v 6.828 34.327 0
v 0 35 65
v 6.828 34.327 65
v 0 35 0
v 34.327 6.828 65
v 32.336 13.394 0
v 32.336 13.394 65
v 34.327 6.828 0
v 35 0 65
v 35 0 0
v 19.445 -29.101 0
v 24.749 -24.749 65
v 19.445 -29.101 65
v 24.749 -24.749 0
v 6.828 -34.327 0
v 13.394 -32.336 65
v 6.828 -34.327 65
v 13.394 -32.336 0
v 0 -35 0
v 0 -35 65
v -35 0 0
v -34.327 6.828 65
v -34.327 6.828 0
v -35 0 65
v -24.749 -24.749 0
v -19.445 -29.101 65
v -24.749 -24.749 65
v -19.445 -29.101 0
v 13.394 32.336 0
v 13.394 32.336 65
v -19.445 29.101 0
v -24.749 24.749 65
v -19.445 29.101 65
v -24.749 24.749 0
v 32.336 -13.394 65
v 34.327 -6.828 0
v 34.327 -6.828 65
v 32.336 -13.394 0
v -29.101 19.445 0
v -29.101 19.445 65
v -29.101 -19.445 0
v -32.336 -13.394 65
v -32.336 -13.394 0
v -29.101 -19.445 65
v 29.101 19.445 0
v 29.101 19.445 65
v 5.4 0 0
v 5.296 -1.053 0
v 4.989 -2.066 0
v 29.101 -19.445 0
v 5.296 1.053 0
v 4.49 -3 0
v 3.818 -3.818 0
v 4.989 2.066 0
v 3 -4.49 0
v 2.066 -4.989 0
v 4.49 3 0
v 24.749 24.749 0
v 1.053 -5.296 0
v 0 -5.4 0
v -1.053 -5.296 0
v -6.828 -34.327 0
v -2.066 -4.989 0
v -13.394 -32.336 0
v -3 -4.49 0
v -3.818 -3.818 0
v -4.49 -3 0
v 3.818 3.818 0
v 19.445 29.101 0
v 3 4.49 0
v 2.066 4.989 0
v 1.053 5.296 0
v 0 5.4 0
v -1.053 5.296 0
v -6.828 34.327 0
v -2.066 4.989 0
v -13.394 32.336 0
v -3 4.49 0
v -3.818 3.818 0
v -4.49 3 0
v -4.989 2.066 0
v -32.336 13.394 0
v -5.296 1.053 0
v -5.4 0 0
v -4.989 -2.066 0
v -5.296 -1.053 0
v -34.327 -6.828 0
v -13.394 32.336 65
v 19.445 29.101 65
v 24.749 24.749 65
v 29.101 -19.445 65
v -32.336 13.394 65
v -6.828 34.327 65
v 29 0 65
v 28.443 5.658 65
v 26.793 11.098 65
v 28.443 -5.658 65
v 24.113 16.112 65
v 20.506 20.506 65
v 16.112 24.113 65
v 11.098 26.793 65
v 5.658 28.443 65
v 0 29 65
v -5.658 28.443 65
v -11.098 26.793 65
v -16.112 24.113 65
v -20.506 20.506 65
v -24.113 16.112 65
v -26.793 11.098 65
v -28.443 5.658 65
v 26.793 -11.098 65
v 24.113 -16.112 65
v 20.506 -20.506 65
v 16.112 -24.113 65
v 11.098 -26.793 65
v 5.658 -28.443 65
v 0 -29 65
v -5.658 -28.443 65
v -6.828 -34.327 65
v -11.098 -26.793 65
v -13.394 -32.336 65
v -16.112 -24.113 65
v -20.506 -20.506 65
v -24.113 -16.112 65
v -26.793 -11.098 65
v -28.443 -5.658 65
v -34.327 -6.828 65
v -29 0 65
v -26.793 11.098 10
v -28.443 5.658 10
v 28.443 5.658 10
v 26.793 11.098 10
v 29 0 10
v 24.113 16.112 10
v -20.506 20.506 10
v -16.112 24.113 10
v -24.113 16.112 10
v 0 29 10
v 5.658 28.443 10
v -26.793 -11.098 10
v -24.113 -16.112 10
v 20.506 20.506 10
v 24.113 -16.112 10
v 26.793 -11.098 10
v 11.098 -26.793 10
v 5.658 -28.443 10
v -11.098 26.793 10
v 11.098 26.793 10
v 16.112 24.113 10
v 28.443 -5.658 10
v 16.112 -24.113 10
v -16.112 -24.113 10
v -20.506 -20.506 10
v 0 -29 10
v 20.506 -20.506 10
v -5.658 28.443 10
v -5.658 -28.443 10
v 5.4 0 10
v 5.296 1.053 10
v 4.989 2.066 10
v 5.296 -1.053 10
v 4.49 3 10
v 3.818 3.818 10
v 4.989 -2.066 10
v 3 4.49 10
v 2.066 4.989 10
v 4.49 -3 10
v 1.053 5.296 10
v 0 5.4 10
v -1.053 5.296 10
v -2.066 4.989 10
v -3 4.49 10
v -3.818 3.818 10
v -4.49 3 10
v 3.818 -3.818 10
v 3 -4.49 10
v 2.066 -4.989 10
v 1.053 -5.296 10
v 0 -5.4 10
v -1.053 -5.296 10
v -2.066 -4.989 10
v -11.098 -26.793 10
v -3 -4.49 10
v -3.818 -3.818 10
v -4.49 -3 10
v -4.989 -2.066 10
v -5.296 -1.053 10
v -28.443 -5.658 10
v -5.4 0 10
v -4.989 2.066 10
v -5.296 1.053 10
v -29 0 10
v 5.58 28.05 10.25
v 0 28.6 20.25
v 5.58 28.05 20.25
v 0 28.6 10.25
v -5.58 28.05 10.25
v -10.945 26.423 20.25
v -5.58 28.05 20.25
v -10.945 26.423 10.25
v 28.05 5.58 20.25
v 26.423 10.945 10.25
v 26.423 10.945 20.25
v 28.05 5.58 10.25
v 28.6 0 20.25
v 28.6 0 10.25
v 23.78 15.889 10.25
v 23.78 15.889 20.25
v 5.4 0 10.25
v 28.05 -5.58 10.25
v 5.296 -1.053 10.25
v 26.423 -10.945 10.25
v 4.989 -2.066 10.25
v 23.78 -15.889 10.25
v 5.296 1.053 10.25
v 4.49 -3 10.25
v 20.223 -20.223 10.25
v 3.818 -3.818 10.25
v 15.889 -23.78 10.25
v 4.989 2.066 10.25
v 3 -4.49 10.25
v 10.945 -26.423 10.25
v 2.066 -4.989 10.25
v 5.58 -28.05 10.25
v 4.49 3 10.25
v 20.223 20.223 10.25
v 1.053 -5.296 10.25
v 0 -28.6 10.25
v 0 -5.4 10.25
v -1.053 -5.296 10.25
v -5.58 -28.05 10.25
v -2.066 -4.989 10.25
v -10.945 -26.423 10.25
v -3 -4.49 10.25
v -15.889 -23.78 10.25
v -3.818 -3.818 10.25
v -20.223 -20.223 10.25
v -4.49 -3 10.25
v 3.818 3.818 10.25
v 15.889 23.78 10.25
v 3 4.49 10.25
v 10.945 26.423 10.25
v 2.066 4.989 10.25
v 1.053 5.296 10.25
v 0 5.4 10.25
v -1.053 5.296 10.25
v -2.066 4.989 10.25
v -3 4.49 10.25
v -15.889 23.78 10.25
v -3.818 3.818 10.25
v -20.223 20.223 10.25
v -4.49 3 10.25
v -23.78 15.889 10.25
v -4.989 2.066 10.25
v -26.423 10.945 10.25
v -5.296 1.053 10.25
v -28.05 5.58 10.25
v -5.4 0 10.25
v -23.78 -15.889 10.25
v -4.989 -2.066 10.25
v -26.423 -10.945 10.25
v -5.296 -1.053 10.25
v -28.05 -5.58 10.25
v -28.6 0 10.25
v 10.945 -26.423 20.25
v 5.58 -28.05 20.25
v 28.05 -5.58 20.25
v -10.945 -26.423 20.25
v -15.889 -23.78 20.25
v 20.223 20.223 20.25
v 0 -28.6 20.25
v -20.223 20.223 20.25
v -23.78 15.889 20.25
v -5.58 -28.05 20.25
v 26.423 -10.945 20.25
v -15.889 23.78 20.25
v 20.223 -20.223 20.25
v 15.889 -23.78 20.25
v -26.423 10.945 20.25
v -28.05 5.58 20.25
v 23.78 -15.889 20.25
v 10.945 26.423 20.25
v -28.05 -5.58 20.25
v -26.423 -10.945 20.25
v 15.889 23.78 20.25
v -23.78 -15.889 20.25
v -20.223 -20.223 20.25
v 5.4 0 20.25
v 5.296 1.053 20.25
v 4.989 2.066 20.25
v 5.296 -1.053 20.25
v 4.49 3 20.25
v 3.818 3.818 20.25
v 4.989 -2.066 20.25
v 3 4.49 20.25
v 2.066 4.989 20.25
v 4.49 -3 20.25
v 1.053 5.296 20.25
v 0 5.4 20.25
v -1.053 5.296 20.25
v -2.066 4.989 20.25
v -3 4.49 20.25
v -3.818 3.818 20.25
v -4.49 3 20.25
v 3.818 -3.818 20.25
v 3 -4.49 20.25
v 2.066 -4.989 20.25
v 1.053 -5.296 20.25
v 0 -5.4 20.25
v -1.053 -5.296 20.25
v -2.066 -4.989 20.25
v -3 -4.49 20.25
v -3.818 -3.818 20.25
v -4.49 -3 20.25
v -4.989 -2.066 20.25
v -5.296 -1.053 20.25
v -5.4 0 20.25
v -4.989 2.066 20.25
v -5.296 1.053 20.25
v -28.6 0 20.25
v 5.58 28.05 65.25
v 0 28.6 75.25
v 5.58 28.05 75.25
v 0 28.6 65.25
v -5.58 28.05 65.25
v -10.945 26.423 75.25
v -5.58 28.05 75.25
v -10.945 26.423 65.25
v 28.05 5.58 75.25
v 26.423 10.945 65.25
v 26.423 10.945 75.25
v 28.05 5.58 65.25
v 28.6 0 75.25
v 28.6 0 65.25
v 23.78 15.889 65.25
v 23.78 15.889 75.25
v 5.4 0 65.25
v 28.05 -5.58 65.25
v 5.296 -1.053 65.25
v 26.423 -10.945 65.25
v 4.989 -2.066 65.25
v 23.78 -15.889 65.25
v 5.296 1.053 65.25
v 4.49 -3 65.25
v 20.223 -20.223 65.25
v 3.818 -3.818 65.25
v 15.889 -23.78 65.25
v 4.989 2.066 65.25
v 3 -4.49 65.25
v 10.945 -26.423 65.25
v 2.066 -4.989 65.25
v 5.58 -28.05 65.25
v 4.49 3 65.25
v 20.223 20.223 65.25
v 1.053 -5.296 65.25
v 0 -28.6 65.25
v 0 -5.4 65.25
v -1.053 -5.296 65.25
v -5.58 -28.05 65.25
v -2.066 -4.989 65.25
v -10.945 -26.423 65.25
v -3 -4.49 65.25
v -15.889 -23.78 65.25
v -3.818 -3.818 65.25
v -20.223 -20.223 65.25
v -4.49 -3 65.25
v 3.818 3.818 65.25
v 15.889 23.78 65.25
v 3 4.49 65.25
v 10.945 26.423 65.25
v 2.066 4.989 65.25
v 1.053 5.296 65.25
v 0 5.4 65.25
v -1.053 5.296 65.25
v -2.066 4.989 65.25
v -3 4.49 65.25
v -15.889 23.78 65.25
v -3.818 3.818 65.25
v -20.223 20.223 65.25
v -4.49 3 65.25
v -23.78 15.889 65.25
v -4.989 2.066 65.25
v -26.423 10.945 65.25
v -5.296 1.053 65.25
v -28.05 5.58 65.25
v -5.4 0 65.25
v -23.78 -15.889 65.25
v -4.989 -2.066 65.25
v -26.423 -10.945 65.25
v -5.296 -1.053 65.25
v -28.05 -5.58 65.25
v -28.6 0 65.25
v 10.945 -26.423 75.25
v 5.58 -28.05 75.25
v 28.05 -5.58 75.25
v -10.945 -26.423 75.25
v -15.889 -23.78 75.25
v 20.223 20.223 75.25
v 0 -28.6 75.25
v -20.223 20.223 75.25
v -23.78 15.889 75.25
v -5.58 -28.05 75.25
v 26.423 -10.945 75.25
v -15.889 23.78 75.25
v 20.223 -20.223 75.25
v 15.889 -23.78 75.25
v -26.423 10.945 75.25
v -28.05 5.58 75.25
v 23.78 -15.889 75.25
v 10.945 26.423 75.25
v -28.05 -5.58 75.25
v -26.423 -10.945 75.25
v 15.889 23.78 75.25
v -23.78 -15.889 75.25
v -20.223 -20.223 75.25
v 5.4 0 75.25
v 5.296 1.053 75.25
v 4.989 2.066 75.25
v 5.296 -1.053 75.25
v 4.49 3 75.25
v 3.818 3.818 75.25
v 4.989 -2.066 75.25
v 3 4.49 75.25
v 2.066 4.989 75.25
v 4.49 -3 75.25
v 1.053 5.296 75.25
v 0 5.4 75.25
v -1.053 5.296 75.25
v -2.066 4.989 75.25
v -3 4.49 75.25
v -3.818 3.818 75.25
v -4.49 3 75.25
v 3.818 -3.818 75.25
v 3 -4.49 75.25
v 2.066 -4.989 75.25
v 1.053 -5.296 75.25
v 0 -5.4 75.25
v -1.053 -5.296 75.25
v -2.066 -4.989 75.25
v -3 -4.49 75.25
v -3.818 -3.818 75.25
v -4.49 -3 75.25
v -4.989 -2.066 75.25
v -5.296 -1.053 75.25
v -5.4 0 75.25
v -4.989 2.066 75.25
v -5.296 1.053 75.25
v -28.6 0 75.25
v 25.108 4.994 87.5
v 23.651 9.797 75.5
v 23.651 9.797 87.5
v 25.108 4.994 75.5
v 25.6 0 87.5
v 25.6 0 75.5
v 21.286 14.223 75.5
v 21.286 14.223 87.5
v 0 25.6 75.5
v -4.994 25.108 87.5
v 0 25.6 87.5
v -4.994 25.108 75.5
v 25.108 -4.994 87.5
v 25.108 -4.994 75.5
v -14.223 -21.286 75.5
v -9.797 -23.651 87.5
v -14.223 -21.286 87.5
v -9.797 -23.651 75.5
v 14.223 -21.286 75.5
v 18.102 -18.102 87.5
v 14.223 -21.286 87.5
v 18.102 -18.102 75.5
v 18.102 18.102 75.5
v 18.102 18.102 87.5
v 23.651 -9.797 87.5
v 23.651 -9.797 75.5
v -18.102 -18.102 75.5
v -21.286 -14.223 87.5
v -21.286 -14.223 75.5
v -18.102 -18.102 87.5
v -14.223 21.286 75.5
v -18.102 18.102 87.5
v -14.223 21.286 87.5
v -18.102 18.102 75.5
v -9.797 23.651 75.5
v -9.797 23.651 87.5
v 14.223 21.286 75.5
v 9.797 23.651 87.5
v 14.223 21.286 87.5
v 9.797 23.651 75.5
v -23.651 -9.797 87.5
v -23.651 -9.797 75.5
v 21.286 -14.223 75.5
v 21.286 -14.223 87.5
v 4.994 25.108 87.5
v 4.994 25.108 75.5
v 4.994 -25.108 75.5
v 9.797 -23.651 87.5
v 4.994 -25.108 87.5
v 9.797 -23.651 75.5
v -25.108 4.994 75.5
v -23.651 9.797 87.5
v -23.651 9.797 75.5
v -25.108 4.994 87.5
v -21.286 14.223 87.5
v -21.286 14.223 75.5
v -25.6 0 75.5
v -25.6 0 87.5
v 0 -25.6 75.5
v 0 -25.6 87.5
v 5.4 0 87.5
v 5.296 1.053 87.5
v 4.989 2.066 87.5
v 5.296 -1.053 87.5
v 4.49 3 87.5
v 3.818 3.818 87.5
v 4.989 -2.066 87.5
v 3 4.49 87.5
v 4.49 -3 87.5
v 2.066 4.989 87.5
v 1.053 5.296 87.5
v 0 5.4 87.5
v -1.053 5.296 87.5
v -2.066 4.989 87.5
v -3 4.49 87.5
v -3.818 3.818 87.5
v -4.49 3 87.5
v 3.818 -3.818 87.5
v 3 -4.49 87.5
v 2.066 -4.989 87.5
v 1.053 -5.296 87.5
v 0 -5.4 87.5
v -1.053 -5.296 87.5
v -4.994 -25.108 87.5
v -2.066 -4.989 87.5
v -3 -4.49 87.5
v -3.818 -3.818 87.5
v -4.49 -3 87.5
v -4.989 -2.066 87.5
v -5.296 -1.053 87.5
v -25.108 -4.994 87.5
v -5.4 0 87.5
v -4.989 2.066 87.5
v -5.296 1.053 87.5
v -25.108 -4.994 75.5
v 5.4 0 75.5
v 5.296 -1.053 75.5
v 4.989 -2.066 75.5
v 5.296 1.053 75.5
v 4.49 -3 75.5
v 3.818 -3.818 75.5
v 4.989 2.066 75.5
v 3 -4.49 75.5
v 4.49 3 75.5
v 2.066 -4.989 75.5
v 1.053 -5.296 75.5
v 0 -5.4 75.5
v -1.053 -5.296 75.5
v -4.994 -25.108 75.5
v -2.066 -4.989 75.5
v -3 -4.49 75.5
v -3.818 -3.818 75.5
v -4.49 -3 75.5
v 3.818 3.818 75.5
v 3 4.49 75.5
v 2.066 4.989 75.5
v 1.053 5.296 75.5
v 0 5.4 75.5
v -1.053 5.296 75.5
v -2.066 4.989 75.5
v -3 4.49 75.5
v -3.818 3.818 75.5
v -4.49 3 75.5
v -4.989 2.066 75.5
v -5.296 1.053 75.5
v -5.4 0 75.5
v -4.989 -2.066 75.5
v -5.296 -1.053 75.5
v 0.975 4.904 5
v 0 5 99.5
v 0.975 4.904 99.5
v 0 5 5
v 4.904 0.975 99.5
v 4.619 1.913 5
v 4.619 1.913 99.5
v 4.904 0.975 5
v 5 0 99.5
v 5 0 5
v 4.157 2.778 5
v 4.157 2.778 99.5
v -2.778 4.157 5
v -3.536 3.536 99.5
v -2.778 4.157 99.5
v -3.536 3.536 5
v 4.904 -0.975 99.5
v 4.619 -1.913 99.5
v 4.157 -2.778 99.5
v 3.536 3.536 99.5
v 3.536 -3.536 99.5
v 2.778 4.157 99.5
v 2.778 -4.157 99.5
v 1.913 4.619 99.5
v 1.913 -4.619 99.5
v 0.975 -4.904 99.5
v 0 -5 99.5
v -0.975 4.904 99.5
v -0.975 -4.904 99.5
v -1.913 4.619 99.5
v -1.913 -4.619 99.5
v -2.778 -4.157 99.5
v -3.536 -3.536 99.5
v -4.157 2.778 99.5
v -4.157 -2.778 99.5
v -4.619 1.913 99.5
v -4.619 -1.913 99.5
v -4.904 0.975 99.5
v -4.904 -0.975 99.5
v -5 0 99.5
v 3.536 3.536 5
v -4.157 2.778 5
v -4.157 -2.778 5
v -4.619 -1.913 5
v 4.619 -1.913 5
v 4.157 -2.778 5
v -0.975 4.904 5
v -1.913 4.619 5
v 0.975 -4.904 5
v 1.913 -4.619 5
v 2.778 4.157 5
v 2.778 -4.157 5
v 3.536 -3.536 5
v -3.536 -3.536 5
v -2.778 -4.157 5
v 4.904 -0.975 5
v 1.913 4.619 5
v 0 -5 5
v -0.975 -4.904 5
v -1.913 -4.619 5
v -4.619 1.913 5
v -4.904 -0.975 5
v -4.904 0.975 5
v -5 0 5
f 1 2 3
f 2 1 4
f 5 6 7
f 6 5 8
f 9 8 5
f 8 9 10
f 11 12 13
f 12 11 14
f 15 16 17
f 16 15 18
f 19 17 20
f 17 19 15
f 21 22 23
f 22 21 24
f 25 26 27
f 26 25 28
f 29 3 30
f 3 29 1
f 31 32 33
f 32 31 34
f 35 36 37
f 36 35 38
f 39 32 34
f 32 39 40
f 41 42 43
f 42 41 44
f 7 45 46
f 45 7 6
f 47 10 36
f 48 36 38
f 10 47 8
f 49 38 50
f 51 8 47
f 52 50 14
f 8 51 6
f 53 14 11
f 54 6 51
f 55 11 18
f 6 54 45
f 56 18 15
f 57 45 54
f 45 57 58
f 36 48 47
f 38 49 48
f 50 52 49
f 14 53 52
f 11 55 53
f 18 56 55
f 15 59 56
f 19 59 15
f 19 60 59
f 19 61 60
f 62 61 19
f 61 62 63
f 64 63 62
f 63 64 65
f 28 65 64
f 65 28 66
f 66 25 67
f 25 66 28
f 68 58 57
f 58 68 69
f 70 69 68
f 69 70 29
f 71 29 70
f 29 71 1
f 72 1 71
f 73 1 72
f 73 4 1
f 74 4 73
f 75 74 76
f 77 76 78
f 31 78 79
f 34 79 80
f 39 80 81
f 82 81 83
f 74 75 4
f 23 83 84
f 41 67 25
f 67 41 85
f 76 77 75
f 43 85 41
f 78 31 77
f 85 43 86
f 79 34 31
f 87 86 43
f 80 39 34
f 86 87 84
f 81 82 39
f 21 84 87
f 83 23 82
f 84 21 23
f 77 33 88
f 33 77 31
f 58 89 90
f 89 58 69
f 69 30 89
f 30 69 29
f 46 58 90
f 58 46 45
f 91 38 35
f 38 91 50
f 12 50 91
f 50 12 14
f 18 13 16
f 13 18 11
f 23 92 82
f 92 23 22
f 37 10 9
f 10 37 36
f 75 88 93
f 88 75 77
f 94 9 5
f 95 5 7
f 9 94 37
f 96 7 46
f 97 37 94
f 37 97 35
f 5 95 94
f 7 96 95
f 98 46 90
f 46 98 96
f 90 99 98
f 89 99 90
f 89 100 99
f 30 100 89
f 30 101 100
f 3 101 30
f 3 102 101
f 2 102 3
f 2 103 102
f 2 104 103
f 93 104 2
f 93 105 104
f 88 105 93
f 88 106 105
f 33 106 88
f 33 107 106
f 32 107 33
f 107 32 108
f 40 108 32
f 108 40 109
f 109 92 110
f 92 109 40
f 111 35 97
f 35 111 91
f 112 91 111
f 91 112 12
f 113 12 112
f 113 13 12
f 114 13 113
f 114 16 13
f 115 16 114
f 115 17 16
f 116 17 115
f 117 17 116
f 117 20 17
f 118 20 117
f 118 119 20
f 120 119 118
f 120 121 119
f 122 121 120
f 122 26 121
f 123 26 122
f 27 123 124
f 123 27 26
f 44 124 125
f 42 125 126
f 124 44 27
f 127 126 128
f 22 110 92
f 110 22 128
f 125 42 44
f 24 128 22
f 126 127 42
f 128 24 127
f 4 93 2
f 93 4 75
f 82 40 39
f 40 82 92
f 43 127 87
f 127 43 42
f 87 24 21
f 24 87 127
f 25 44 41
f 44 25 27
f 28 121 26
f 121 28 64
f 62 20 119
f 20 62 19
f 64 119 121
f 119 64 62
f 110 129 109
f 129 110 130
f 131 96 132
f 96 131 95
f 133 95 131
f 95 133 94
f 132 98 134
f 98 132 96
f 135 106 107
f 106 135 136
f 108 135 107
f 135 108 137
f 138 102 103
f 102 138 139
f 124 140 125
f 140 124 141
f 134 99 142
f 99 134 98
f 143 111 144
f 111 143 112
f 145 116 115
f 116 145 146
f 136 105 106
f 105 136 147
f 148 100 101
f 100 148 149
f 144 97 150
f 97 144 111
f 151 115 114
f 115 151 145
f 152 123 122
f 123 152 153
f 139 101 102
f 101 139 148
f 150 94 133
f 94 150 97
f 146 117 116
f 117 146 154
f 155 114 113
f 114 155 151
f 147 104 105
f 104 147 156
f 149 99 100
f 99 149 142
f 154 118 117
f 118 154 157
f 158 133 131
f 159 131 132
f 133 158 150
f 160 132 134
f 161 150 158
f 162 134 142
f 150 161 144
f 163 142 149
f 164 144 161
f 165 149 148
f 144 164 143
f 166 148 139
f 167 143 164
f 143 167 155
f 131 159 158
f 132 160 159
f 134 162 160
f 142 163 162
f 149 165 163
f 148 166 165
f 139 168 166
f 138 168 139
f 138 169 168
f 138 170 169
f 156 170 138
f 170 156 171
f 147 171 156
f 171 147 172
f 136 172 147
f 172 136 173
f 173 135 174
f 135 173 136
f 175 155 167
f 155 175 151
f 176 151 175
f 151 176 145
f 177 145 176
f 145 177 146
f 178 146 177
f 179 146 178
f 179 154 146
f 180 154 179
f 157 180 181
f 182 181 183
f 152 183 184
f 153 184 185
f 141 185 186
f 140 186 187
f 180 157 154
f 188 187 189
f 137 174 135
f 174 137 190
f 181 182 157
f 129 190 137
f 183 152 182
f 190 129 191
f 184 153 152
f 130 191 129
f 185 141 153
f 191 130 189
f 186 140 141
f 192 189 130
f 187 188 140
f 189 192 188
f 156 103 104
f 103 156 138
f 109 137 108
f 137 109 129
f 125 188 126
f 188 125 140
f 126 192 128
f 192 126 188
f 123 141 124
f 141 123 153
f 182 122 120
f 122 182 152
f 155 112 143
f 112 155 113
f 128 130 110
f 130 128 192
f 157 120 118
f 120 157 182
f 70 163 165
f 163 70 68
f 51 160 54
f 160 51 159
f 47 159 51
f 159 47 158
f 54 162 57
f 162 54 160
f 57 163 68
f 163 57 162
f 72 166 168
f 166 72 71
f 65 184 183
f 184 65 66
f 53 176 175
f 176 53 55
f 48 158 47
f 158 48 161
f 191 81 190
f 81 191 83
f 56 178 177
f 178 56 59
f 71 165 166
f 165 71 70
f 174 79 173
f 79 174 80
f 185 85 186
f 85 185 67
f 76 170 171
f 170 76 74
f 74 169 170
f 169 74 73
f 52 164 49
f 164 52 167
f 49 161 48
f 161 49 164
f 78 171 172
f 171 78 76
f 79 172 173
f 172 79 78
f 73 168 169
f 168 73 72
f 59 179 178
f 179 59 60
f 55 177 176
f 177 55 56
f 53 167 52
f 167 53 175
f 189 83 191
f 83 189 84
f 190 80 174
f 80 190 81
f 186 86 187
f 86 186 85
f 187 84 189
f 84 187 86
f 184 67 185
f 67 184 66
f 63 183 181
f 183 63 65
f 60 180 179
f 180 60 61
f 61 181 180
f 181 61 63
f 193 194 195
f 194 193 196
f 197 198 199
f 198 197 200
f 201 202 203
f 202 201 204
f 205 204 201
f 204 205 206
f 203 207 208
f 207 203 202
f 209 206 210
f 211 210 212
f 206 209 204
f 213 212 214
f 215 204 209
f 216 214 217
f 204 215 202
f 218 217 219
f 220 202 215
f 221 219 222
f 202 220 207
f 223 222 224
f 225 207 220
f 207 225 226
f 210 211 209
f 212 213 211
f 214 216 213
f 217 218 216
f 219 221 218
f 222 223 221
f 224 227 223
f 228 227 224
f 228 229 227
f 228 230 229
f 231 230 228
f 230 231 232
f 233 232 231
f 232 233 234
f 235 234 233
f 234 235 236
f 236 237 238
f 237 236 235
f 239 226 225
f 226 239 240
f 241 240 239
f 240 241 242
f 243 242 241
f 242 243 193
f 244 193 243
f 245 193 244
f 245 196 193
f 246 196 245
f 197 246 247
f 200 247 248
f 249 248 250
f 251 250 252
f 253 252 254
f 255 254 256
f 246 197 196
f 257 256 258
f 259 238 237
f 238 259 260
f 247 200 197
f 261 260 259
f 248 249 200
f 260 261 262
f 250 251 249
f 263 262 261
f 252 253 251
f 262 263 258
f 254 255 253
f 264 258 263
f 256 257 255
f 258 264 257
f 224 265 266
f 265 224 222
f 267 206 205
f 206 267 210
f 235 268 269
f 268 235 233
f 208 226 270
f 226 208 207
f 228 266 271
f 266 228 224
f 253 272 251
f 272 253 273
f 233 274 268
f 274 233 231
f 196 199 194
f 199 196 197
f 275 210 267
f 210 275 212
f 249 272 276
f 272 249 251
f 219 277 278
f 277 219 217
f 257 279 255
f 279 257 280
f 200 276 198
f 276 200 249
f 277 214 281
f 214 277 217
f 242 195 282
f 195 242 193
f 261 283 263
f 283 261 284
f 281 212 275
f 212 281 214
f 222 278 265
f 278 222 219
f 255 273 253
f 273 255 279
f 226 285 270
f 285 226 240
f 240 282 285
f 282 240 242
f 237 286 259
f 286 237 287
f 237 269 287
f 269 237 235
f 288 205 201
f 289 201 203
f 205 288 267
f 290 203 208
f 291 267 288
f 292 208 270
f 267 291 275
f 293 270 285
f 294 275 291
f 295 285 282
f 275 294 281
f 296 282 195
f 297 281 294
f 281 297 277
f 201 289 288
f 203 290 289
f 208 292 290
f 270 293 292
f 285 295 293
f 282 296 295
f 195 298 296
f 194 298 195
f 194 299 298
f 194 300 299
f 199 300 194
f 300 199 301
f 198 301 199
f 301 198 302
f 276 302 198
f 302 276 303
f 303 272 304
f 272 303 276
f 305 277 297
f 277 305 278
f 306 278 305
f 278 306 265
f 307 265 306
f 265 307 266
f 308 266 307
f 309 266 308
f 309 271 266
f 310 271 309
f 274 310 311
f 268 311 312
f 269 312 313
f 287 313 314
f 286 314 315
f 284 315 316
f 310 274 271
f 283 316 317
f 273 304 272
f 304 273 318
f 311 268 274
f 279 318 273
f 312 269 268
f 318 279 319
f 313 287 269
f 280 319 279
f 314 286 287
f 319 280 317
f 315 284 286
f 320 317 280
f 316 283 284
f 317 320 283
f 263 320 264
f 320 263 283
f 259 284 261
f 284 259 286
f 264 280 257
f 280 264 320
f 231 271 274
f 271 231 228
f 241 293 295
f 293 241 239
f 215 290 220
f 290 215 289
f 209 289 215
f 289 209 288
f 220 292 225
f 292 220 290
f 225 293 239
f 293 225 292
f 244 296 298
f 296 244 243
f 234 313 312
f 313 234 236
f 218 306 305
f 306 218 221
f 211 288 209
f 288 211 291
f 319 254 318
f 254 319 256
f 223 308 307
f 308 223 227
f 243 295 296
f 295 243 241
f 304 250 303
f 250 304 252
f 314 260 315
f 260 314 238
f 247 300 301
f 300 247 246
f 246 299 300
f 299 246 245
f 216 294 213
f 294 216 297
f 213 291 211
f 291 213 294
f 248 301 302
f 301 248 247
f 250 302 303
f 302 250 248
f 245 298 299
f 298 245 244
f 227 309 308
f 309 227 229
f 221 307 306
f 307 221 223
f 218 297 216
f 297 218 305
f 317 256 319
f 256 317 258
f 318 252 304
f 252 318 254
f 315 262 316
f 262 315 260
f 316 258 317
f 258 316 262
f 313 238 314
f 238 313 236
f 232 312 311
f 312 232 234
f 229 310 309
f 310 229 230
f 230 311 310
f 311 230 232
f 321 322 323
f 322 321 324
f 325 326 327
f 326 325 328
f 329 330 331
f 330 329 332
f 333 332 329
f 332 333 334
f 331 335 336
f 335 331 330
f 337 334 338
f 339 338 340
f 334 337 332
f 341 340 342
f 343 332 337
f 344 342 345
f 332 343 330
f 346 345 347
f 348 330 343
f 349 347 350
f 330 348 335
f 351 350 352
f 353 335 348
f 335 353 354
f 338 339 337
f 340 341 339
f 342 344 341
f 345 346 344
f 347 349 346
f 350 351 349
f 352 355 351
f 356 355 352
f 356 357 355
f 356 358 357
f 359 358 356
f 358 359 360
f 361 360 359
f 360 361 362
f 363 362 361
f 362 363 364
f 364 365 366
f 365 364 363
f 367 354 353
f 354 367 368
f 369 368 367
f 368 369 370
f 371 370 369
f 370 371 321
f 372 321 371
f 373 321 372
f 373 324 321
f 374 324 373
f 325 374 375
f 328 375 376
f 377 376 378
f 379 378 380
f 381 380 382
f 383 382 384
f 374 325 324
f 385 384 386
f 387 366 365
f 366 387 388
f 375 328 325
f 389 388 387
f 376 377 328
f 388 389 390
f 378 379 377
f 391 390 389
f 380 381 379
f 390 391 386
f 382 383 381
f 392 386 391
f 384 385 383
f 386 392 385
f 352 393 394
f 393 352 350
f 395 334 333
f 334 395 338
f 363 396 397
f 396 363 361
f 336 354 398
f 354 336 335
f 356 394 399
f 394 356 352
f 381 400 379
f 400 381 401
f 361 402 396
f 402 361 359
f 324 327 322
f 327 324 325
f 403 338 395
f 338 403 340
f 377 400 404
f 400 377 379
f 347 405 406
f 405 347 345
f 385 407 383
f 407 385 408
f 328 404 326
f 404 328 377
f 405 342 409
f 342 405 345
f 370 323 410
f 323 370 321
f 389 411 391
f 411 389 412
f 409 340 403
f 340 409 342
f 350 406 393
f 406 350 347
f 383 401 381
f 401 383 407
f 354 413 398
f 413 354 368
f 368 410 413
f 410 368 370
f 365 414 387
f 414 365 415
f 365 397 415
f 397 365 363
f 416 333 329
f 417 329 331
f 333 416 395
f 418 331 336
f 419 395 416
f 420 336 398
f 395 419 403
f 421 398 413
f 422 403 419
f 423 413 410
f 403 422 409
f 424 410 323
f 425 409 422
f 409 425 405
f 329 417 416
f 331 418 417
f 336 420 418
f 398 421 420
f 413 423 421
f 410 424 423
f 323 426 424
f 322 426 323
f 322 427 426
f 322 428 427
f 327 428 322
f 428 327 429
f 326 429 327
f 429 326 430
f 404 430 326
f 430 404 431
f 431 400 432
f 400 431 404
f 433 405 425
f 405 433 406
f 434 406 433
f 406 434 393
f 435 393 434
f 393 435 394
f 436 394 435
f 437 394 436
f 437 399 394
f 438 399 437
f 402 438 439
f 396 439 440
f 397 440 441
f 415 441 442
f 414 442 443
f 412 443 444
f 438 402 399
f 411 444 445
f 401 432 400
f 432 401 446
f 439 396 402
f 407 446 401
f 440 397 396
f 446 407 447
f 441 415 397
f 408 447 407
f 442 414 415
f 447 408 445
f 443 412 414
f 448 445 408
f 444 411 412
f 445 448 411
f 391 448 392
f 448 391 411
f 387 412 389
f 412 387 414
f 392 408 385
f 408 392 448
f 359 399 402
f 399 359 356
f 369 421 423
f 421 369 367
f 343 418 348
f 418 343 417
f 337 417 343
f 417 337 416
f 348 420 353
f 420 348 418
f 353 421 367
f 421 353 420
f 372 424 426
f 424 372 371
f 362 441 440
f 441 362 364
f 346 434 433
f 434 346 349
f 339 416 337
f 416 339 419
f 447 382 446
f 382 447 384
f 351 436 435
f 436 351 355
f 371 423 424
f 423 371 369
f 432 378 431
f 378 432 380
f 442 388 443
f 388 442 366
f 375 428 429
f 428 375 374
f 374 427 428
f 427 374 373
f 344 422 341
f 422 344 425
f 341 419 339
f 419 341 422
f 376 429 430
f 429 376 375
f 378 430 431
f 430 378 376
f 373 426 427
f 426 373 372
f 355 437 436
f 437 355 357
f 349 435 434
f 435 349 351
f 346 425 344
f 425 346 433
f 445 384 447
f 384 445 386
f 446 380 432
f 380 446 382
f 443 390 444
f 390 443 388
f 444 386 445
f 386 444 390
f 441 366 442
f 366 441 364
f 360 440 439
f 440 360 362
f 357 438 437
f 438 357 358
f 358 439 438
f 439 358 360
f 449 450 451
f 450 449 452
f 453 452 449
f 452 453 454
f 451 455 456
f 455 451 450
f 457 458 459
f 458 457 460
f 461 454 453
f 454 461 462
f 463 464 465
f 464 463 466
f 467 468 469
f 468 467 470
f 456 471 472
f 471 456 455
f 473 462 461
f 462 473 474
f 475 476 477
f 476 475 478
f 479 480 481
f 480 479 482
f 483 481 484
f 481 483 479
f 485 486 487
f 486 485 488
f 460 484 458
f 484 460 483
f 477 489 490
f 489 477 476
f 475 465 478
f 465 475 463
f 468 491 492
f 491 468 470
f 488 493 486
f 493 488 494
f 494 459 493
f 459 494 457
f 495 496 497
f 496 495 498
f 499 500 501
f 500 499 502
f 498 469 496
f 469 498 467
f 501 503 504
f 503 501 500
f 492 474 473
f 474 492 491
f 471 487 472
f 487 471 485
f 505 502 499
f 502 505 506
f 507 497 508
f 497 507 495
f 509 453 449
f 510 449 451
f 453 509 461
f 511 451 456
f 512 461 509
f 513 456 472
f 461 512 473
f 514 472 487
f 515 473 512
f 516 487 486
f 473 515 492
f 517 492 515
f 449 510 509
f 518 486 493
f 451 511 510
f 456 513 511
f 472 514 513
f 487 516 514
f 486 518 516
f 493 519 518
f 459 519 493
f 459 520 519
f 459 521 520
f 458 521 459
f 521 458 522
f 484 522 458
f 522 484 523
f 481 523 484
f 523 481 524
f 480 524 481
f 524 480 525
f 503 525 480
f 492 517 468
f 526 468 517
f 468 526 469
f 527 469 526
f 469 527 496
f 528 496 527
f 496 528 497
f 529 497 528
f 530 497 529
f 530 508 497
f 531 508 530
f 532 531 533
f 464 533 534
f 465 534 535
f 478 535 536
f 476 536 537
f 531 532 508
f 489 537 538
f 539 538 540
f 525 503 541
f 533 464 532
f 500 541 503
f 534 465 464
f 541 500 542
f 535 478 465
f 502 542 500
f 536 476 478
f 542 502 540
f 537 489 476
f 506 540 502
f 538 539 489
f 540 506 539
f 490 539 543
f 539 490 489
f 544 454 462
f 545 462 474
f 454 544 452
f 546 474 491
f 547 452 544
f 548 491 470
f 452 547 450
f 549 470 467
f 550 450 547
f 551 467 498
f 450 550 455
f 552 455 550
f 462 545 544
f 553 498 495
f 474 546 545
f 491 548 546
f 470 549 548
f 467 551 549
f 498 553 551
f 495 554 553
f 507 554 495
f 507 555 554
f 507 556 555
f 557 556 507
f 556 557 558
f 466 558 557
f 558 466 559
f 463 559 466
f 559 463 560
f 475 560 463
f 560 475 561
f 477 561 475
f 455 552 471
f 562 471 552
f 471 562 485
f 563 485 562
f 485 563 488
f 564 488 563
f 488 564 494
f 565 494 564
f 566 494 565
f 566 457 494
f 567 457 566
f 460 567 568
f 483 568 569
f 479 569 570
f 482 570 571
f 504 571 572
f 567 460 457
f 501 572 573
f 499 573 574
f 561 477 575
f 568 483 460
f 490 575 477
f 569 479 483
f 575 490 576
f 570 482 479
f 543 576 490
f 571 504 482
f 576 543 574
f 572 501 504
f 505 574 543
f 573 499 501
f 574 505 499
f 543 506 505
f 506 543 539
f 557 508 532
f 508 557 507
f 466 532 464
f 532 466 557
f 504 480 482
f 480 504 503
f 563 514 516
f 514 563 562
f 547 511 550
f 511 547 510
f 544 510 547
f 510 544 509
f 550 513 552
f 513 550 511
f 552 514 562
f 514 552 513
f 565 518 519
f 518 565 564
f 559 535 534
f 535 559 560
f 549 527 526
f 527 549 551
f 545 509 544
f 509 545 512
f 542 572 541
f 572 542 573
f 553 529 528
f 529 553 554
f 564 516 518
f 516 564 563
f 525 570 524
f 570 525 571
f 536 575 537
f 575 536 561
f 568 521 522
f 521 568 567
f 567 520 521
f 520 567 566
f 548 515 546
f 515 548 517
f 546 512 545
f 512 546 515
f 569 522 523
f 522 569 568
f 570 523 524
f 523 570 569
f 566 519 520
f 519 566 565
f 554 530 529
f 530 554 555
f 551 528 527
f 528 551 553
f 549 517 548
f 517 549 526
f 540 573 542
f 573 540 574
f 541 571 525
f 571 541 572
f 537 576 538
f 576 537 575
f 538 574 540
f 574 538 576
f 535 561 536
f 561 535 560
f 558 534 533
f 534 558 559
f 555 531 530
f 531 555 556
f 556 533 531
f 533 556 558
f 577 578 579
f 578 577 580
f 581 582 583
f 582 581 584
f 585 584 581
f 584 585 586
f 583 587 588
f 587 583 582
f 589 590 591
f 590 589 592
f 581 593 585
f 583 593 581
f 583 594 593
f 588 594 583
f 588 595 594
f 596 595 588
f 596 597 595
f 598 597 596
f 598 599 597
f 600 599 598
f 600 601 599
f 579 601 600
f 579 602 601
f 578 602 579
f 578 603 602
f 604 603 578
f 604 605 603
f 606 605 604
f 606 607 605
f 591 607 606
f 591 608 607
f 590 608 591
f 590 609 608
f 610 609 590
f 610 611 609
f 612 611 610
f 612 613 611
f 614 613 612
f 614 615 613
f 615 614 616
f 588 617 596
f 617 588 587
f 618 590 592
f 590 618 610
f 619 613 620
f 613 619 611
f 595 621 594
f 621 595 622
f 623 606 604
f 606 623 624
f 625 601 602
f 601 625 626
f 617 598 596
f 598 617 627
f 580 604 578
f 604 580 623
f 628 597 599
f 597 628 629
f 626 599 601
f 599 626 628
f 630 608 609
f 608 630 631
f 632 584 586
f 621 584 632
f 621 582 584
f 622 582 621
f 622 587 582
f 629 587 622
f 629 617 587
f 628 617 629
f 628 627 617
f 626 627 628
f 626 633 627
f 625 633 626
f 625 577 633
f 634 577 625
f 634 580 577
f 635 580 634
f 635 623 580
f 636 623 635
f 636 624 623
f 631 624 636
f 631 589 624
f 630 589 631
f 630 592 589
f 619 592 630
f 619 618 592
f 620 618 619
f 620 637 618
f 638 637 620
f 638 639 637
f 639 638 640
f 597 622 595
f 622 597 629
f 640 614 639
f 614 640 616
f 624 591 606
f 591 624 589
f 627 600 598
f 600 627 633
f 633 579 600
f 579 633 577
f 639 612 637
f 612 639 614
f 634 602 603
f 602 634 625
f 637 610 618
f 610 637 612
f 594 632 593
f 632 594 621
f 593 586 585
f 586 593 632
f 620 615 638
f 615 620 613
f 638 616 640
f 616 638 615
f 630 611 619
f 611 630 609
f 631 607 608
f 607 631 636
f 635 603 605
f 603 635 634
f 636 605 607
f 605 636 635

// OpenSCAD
$fn = 32;

// ------------------------------------------------------------------------
// Bearing housing: housing d70, two bearings and a shaft
// Every part is its own module, assembly() places them once.
// ------------------------------------------------------------------------

// --- part 1 ---
module housing() {
  difference() {
    cylinder(h = 65, d = 70);
    translate([0, 0, 10]) cylinder(h = 56, d = 58);
    translate([0, 0, -1]) cylinder(h = 12, d = 10.8);
  }
}

// --- part 2 ---
module bearing_lower() {
  difference() {
      translate([0, 0, 0]) cylinder(h = 10, d = 57.2);
      translate([0, 0, -1]) cylinder(h = 12, d = 10.8);
    }
}

// --- part 3 ---
module bearing_upper() {
  difference() {
      translate([0, 0, 0]) cylinder(h = 10, d = 57.2);
      translate([0, 0, -1]) cylinder(h = 12, d = 10.8);
    }
}

// --- part 4 ---
module spacer() {
  difference() {
      translate([0, 0, 0]) cylinder(h = 12, d = 51.2);
      translate([0, 0, -1]) cylinder(h = 14, d = 10.8);
    }
}

// --- part 5 ---
module shaft() {
  translate([0, 0, -47.25]) cylinder(h = 94.5, d = 10);
}

// --- assembly ---
module assembly() {
  translate([0, 0, 0]) rotate([0, 0, 0]) housing();
  translate([0, 0, 10.25]) rotate([0, 0, 0]) bearing_lower();
  translate([0, 0, 65.25]) rotate([0, 0, 0]) bearing_upper();
  translate([0, 0, 75.5]) rotate([0, 0, 0]) spacer();
  translate([0, 0, 52.25]) rotate([0, 0, 0]) shaft();
}

assembly();
